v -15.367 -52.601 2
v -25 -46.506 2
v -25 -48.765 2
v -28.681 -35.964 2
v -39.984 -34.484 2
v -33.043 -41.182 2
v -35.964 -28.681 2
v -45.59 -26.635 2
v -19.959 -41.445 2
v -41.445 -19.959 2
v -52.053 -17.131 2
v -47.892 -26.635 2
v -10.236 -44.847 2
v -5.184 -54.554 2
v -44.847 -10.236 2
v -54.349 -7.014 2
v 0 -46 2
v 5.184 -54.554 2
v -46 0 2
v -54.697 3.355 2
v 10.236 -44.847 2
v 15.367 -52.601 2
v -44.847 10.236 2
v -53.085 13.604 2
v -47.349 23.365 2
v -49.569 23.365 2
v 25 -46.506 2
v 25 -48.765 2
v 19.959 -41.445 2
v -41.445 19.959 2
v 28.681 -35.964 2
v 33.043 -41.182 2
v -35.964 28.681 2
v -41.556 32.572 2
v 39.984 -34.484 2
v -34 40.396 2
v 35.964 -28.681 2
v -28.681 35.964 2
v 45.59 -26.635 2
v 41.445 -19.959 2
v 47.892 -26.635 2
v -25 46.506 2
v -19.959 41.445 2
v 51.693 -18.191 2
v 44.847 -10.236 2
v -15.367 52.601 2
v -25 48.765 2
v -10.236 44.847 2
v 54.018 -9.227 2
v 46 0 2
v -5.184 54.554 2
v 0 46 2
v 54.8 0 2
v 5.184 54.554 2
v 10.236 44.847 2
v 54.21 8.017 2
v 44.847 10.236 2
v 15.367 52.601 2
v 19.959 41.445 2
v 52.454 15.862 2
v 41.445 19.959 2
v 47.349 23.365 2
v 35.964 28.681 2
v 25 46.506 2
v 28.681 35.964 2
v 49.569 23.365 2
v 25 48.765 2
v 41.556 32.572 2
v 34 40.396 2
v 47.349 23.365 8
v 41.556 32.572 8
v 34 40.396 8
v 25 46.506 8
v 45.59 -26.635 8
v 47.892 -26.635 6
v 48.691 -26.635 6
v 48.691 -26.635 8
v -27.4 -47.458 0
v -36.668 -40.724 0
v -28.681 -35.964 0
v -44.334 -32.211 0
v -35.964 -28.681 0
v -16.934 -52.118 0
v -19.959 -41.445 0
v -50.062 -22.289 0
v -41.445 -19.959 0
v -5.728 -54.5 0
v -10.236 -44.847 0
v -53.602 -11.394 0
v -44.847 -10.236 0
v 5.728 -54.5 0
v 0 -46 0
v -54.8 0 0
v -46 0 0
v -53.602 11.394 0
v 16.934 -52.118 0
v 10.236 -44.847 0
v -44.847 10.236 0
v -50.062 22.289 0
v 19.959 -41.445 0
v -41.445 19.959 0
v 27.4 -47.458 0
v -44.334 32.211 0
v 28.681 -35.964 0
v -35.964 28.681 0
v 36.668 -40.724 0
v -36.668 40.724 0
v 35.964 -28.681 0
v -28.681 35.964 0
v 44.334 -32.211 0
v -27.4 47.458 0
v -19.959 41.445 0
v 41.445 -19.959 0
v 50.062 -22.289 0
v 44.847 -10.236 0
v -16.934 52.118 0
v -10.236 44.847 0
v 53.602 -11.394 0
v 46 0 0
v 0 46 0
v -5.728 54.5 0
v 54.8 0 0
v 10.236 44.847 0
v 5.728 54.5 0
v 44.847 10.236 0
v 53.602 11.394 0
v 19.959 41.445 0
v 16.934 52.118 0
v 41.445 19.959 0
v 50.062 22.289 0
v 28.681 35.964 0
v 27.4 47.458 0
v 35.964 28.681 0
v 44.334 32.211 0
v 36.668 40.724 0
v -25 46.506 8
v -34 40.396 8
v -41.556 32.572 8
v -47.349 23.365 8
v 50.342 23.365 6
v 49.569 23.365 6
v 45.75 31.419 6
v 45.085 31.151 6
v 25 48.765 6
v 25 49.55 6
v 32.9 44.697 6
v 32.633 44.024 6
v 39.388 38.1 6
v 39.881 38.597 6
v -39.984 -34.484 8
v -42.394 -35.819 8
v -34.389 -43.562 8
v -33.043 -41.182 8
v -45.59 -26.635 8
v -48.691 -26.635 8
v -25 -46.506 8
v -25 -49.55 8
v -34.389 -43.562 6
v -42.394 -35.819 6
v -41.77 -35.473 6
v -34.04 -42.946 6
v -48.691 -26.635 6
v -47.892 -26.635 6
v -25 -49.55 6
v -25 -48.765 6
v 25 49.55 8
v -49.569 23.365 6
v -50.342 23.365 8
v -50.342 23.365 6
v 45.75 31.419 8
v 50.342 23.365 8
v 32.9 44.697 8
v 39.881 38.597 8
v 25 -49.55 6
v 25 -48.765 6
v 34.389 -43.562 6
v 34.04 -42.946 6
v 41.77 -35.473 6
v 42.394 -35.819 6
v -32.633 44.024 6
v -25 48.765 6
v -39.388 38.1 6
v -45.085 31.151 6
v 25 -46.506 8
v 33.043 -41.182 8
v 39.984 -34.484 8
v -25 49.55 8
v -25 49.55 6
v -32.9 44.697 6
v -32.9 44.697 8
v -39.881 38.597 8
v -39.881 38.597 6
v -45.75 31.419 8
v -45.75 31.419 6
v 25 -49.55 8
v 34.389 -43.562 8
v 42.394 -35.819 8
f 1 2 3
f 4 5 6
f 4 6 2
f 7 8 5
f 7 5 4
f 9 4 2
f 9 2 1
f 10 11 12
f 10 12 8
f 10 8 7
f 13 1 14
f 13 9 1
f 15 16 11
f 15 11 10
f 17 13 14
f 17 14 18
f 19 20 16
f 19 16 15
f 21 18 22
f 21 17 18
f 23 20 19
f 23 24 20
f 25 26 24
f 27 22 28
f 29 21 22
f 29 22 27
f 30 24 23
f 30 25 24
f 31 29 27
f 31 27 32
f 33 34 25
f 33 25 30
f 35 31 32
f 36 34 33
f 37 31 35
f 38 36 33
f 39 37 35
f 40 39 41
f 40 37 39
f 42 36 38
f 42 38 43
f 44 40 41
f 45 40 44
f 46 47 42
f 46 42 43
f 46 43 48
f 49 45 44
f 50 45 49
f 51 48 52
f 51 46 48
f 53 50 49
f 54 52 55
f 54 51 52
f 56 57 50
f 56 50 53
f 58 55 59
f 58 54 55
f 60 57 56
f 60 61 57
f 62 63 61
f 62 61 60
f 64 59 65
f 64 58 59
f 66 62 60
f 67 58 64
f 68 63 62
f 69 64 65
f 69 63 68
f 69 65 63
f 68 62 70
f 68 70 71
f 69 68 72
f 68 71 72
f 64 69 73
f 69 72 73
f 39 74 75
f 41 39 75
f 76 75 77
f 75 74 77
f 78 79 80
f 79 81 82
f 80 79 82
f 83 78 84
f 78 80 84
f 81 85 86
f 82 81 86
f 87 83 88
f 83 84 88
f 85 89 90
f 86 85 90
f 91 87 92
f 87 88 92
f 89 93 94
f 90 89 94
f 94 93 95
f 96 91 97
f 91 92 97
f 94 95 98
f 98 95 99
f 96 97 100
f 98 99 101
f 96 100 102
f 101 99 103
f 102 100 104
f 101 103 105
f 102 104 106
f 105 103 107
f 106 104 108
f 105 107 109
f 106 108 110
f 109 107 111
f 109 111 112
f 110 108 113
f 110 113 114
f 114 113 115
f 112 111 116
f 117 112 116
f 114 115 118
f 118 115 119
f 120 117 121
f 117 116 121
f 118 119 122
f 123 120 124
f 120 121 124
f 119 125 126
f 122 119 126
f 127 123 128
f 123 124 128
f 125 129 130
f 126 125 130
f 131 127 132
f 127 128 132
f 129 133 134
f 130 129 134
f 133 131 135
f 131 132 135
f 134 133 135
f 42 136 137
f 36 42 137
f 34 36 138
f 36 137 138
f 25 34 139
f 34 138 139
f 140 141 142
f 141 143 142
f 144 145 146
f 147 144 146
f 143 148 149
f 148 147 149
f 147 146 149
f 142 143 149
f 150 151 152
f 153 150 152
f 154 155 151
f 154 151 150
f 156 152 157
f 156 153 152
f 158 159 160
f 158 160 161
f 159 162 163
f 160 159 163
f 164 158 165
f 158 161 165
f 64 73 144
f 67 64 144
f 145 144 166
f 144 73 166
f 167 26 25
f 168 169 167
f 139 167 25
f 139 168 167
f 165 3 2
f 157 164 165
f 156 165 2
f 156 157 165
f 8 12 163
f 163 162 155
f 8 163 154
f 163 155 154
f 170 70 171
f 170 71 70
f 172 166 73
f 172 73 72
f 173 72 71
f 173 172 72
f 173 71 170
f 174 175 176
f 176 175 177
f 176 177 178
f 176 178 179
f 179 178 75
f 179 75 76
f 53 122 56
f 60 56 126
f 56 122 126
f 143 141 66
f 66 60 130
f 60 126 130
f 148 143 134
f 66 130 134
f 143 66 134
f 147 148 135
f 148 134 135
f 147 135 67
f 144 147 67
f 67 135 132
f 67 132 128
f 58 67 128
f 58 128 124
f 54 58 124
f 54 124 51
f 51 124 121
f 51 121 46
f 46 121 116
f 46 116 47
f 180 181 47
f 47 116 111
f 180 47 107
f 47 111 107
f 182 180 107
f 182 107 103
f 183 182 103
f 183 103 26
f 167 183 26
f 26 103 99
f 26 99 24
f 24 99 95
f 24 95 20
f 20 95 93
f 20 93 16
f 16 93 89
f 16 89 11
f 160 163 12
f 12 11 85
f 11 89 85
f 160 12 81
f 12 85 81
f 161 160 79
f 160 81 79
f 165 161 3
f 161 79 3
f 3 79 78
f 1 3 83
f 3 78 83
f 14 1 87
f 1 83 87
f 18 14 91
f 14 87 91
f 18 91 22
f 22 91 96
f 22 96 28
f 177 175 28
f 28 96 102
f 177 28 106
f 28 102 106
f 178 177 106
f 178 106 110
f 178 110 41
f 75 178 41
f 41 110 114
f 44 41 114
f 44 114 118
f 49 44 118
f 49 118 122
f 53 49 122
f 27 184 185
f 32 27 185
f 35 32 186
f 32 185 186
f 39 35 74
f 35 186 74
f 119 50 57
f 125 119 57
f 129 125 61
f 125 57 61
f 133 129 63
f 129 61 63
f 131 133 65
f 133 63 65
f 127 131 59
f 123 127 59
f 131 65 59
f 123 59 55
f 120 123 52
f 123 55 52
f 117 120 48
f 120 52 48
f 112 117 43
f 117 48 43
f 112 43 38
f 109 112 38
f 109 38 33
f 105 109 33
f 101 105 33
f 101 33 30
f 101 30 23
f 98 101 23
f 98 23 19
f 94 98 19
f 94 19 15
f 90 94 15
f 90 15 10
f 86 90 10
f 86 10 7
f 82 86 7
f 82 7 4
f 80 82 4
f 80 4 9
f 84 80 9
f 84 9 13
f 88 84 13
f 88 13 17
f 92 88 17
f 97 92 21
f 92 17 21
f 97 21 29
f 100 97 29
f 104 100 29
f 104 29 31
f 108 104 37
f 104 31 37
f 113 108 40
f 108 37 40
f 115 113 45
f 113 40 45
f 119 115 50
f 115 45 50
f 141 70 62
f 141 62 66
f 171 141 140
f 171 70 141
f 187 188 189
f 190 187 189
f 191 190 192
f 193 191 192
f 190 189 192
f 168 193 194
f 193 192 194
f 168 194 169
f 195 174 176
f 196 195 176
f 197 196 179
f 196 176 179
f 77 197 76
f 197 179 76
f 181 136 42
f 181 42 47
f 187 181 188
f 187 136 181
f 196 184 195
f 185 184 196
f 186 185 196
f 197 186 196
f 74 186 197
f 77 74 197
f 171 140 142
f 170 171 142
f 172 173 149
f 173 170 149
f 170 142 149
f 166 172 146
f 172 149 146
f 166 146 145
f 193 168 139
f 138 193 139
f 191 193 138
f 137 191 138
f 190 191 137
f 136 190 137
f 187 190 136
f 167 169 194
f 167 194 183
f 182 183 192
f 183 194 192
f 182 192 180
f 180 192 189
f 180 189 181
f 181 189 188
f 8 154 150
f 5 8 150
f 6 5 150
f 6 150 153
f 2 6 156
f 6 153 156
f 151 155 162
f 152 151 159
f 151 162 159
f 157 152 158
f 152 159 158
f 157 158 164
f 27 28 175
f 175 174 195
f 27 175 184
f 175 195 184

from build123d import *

# Parameters (mm, degrees)
F0_R      = 54.8
F1_DEPTH  = 6
F2_R      = 55.5
F3_DEPTH  = 2
F4_R      = 52.8
F5_DEPTH  = 6
F6_R      = 46
F7_DEPTH  = 25
F8_W      = 50
F8_H      = 120
F9_DEPTH  = 6
F10_W     = 120
F10_H     = 50
F11_DEPTH = 6


with BuildPart() as f1:
    # F0 (on Top) → F1 (new body)
    with BuildSketch(Plane.XY):
        Circle(F0_R)
    extrude(amount=F1_DEPTH)

    # F2 (on face) → F3 (join)
    with BuildSketch(Plane.XY.offset(6)):
        Circle(F2_R)
    extrude(amount=F3_DEPTH)

    # F4 (on face) → F5 (cut)
    with BuildSketch(Plane.XY.offset(8)):
        Circle(F4_R)
    extrude(amount=-F5_DEPTH, mode=Mode.SUBTRACT)

    # F6 (on face) → F7 (cut)
    with BuildSketch(Plane.XY.offset(2)):
        Circle(F6_R)
    extrude(amount=-F7_DEPTH, mode=Mode.SUBTRACT)

    # F8 (on face) → F9 (cut)
    with BuildSketch(Plane.XY.offset(8)):
        Rectangle(F8_W, F8_H)
    extrude(amount=-F9_DEPTH, mode=Mode.SUBTRACT)

    # F10 (on face) → F11 (cut)
    with BuildSketch(Plane.XY.offset(8)):
        with Locations((0, -1.634858)):
            Rectangle(F10_W, F10_H)
    extrude(amount=-F11_DEPTH, mode=Mode.SUBTRACT)


solid = f1.part
